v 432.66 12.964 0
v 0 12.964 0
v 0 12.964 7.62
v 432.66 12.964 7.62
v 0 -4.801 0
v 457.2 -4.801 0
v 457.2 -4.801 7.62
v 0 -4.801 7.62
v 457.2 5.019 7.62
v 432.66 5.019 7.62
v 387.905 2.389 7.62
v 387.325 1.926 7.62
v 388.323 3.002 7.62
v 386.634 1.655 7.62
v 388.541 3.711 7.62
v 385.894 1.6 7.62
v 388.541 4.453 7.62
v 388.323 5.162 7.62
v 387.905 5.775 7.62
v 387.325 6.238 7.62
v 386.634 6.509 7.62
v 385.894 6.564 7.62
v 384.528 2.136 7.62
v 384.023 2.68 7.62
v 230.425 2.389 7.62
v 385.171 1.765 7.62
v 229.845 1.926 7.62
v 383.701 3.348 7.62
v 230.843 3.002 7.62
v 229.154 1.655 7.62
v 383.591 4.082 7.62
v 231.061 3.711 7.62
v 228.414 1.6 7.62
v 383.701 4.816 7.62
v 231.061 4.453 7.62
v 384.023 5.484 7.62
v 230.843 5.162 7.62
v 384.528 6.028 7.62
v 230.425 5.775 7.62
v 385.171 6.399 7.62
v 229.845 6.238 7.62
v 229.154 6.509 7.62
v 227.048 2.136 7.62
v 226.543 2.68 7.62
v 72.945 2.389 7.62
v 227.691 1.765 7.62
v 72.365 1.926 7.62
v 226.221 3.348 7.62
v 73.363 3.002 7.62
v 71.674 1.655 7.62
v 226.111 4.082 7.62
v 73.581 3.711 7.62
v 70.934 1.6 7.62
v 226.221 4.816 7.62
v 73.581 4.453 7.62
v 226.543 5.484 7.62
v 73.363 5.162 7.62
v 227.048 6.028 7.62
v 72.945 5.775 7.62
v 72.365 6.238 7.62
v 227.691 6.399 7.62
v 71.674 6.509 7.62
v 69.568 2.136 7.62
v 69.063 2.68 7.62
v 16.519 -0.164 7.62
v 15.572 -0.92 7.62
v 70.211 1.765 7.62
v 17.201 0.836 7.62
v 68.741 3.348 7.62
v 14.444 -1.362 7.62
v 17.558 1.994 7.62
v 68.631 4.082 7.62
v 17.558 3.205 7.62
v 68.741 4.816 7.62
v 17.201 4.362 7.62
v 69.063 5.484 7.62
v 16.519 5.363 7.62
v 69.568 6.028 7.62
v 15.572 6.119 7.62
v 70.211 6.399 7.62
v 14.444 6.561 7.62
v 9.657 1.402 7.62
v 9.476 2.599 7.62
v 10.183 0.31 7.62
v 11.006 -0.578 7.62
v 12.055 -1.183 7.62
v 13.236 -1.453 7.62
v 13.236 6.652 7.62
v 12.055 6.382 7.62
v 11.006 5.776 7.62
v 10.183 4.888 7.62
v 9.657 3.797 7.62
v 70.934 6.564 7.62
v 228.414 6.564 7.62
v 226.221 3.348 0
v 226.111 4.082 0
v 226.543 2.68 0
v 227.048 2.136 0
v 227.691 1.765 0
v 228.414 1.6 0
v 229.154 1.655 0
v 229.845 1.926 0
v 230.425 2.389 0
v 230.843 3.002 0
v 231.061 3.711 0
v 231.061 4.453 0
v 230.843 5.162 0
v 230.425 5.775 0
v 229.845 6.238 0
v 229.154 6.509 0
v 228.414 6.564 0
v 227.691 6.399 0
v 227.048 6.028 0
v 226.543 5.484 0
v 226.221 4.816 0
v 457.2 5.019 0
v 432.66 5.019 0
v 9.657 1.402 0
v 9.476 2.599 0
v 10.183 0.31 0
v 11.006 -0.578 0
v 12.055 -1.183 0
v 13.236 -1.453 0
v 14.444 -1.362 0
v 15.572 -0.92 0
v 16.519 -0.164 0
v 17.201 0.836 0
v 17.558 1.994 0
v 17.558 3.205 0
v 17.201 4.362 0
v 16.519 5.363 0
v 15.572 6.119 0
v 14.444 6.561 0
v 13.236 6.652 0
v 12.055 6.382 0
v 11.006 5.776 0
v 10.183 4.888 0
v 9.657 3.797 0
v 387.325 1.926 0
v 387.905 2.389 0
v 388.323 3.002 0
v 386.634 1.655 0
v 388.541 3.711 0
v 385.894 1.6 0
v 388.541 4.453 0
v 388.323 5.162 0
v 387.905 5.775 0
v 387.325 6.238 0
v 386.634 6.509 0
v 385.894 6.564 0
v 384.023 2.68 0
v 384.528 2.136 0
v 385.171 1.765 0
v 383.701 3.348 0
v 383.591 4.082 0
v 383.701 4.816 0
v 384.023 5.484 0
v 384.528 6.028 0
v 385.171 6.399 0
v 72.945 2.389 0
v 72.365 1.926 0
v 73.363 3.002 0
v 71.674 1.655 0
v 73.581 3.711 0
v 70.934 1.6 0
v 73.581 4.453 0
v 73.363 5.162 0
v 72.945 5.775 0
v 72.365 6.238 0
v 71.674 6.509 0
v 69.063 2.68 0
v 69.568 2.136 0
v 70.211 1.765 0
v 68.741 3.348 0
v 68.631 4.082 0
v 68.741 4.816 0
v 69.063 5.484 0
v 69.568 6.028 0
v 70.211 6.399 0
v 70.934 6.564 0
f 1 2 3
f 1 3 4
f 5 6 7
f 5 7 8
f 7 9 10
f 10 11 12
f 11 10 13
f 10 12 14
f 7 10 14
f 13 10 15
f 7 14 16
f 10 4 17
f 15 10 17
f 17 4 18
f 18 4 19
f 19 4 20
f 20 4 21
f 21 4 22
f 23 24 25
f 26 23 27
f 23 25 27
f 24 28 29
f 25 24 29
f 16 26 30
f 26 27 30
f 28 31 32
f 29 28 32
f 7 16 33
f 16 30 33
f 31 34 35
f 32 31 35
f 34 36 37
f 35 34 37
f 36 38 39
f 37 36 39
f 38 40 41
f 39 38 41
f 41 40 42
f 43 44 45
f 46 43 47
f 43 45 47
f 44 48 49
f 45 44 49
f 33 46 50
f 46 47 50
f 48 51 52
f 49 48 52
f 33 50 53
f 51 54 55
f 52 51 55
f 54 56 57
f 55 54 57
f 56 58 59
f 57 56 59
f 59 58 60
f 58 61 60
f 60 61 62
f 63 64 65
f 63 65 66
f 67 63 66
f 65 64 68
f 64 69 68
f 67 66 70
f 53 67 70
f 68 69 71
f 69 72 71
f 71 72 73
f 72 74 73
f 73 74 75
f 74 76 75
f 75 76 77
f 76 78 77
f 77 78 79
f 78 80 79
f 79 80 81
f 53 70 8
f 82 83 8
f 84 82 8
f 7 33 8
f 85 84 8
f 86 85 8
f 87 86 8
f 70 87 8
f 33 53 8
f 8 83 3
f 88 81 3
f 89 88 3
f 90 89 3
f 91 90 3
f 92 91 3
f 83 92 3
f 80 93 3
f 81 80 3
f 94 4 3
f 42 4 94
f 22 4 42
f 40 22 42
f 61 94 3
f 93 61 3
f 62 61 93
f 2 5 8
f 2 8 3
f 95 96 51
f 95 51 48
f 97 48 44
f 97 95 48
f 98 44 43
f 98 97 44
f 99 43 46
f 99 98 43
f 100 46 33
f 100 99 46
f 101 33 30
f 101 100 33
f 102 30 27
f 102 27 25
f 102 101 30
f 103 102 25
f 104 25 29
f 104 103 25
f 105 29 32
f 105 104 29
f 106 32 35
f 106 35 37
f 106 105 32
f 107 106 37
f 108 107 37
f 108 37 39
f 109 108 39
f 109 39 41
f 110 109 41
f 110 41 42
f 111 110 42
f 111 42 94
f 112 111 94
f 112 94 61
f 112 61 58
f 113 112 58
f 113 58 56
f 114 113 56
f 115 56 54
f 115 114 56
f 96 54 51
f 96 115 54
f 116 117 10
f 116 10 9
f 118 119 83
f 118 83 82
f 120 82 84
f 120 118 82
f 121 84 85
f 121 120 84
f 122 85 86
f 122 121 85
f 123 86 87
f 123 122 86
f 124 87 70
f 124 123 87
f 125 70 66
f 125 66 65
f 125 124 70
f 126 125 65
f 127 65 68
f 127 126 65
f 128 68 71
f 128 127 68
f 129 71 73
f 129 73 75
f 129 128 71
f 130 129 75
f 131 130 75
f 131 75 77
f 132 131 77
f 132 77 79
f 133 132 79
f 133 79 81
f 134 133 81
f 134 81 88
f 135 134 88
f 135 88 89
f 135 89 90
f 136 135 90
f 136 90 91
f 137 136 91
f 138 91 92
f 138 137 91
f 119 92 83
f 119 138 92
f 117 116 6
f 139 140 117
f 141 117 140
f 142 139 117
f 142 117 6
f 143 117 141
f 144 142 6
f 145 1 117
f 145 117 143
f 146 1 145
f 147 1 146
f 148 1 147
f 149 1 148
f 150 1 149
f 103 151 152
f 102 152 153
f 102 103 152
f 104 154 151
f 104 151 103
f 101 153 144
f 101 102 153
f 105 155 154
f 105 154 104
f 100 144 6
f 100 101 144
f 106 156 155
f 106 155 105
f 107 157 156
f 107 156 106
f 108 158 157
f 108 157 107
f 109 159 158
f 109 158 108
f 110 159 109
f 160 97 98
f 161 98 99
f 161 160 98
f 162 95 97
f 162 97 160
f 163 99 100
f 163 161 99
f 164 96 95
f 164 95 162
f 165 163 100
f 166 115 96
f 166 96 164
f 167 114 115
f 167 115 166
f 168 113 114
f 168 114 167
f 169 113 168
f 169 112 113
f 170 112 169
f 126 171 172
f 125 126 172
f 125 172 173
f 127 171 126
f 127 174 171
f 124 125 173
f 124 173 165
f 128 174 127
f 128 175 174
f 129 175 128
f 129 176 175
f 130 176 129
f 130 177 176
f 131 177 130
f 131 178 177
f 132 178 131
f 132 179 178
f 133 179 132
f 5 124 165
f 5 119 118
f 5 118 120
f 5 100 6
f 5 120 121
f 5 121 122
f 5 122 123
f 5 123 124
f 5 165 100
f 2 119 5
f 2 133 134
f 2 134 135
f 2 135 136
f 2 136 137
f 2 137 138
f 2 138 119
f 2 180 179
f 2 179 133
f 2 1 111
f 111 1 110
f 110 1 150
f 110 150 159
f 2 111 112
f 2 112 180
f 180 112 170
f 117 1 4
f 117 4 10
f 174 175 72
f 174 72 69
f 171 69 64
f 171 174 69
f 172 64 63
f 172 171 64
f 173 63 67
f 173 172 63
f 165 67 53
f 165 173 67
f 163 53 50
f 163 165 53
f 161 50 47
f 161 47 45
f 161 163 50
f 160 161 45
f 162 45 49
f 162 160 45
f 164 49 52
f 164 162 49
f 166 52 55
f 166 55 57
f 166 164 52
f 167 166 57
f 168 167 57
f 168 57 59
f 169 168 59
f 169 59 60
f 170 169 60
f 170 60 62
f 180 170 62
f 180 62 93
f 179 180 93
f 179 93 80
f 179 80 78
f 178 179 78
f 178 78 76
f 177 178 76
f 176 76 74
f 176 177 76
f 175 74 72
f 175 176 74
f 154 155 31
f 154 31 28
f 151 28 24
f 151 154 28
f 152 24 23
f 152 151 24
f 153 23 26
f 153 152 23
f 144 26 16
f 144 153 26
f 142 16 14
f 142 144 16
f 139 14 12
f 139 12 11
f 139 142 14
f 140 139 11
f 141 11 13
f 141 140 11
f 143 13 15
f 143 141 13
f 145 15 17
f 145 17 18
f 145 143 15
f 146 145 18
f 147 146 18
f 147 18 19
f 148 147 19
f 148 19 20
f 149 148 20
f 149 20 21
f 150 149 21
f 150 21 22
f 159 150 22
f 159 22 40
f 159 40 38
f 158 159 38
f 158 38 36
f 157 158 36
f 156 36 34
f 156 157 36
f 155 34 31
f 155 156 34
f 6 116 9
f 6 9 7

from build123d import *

# Parameters (mm, degrees)
SKETCH1_R           = 2.4892
SKETCH1_R_2         = 4.0635
BOSS_EXTRUDE1_DEPTH = 7.62


with BuildPart() as part:
    # Sketch1 → Boss-Extrude1 (new body)
    with BuildSketch(Plane.XY):
        Polygon((0, 12.964410589), (432.660000058, 12.964410589), (432.660000058, 5.019410589), (457.2, 5.019410589), (457.2, -4.800589411), (0, -4.800589411), align=None)
        with Locations(Location((386.08, 4.081910589, 0), (0, 0, 180))):
            Circle(SKETCH1_R, mode=Mode.SUBTRACT)
        with Locations(Location((228.6, 4.081910589, 0), (0, 0, 180))):
            Circle(SKETCH1_R, mode=Mode.SUBTRACT)
        with Locations(Location((71.12, 4.081910589, 0), (0, 0, 180))):
            Circle(SKETCH1_R, mode=Mode.SUBTRACT)
        with Locations(Location((13.54, 2.599410589, 0), (0, 0, 180))):
            Circle(SKETCH1_R_2, mode=Mode.SUBTRACT)
    extrude(amount=BOSS_EXTRUDE1_DEPTH)


solid = part.part
